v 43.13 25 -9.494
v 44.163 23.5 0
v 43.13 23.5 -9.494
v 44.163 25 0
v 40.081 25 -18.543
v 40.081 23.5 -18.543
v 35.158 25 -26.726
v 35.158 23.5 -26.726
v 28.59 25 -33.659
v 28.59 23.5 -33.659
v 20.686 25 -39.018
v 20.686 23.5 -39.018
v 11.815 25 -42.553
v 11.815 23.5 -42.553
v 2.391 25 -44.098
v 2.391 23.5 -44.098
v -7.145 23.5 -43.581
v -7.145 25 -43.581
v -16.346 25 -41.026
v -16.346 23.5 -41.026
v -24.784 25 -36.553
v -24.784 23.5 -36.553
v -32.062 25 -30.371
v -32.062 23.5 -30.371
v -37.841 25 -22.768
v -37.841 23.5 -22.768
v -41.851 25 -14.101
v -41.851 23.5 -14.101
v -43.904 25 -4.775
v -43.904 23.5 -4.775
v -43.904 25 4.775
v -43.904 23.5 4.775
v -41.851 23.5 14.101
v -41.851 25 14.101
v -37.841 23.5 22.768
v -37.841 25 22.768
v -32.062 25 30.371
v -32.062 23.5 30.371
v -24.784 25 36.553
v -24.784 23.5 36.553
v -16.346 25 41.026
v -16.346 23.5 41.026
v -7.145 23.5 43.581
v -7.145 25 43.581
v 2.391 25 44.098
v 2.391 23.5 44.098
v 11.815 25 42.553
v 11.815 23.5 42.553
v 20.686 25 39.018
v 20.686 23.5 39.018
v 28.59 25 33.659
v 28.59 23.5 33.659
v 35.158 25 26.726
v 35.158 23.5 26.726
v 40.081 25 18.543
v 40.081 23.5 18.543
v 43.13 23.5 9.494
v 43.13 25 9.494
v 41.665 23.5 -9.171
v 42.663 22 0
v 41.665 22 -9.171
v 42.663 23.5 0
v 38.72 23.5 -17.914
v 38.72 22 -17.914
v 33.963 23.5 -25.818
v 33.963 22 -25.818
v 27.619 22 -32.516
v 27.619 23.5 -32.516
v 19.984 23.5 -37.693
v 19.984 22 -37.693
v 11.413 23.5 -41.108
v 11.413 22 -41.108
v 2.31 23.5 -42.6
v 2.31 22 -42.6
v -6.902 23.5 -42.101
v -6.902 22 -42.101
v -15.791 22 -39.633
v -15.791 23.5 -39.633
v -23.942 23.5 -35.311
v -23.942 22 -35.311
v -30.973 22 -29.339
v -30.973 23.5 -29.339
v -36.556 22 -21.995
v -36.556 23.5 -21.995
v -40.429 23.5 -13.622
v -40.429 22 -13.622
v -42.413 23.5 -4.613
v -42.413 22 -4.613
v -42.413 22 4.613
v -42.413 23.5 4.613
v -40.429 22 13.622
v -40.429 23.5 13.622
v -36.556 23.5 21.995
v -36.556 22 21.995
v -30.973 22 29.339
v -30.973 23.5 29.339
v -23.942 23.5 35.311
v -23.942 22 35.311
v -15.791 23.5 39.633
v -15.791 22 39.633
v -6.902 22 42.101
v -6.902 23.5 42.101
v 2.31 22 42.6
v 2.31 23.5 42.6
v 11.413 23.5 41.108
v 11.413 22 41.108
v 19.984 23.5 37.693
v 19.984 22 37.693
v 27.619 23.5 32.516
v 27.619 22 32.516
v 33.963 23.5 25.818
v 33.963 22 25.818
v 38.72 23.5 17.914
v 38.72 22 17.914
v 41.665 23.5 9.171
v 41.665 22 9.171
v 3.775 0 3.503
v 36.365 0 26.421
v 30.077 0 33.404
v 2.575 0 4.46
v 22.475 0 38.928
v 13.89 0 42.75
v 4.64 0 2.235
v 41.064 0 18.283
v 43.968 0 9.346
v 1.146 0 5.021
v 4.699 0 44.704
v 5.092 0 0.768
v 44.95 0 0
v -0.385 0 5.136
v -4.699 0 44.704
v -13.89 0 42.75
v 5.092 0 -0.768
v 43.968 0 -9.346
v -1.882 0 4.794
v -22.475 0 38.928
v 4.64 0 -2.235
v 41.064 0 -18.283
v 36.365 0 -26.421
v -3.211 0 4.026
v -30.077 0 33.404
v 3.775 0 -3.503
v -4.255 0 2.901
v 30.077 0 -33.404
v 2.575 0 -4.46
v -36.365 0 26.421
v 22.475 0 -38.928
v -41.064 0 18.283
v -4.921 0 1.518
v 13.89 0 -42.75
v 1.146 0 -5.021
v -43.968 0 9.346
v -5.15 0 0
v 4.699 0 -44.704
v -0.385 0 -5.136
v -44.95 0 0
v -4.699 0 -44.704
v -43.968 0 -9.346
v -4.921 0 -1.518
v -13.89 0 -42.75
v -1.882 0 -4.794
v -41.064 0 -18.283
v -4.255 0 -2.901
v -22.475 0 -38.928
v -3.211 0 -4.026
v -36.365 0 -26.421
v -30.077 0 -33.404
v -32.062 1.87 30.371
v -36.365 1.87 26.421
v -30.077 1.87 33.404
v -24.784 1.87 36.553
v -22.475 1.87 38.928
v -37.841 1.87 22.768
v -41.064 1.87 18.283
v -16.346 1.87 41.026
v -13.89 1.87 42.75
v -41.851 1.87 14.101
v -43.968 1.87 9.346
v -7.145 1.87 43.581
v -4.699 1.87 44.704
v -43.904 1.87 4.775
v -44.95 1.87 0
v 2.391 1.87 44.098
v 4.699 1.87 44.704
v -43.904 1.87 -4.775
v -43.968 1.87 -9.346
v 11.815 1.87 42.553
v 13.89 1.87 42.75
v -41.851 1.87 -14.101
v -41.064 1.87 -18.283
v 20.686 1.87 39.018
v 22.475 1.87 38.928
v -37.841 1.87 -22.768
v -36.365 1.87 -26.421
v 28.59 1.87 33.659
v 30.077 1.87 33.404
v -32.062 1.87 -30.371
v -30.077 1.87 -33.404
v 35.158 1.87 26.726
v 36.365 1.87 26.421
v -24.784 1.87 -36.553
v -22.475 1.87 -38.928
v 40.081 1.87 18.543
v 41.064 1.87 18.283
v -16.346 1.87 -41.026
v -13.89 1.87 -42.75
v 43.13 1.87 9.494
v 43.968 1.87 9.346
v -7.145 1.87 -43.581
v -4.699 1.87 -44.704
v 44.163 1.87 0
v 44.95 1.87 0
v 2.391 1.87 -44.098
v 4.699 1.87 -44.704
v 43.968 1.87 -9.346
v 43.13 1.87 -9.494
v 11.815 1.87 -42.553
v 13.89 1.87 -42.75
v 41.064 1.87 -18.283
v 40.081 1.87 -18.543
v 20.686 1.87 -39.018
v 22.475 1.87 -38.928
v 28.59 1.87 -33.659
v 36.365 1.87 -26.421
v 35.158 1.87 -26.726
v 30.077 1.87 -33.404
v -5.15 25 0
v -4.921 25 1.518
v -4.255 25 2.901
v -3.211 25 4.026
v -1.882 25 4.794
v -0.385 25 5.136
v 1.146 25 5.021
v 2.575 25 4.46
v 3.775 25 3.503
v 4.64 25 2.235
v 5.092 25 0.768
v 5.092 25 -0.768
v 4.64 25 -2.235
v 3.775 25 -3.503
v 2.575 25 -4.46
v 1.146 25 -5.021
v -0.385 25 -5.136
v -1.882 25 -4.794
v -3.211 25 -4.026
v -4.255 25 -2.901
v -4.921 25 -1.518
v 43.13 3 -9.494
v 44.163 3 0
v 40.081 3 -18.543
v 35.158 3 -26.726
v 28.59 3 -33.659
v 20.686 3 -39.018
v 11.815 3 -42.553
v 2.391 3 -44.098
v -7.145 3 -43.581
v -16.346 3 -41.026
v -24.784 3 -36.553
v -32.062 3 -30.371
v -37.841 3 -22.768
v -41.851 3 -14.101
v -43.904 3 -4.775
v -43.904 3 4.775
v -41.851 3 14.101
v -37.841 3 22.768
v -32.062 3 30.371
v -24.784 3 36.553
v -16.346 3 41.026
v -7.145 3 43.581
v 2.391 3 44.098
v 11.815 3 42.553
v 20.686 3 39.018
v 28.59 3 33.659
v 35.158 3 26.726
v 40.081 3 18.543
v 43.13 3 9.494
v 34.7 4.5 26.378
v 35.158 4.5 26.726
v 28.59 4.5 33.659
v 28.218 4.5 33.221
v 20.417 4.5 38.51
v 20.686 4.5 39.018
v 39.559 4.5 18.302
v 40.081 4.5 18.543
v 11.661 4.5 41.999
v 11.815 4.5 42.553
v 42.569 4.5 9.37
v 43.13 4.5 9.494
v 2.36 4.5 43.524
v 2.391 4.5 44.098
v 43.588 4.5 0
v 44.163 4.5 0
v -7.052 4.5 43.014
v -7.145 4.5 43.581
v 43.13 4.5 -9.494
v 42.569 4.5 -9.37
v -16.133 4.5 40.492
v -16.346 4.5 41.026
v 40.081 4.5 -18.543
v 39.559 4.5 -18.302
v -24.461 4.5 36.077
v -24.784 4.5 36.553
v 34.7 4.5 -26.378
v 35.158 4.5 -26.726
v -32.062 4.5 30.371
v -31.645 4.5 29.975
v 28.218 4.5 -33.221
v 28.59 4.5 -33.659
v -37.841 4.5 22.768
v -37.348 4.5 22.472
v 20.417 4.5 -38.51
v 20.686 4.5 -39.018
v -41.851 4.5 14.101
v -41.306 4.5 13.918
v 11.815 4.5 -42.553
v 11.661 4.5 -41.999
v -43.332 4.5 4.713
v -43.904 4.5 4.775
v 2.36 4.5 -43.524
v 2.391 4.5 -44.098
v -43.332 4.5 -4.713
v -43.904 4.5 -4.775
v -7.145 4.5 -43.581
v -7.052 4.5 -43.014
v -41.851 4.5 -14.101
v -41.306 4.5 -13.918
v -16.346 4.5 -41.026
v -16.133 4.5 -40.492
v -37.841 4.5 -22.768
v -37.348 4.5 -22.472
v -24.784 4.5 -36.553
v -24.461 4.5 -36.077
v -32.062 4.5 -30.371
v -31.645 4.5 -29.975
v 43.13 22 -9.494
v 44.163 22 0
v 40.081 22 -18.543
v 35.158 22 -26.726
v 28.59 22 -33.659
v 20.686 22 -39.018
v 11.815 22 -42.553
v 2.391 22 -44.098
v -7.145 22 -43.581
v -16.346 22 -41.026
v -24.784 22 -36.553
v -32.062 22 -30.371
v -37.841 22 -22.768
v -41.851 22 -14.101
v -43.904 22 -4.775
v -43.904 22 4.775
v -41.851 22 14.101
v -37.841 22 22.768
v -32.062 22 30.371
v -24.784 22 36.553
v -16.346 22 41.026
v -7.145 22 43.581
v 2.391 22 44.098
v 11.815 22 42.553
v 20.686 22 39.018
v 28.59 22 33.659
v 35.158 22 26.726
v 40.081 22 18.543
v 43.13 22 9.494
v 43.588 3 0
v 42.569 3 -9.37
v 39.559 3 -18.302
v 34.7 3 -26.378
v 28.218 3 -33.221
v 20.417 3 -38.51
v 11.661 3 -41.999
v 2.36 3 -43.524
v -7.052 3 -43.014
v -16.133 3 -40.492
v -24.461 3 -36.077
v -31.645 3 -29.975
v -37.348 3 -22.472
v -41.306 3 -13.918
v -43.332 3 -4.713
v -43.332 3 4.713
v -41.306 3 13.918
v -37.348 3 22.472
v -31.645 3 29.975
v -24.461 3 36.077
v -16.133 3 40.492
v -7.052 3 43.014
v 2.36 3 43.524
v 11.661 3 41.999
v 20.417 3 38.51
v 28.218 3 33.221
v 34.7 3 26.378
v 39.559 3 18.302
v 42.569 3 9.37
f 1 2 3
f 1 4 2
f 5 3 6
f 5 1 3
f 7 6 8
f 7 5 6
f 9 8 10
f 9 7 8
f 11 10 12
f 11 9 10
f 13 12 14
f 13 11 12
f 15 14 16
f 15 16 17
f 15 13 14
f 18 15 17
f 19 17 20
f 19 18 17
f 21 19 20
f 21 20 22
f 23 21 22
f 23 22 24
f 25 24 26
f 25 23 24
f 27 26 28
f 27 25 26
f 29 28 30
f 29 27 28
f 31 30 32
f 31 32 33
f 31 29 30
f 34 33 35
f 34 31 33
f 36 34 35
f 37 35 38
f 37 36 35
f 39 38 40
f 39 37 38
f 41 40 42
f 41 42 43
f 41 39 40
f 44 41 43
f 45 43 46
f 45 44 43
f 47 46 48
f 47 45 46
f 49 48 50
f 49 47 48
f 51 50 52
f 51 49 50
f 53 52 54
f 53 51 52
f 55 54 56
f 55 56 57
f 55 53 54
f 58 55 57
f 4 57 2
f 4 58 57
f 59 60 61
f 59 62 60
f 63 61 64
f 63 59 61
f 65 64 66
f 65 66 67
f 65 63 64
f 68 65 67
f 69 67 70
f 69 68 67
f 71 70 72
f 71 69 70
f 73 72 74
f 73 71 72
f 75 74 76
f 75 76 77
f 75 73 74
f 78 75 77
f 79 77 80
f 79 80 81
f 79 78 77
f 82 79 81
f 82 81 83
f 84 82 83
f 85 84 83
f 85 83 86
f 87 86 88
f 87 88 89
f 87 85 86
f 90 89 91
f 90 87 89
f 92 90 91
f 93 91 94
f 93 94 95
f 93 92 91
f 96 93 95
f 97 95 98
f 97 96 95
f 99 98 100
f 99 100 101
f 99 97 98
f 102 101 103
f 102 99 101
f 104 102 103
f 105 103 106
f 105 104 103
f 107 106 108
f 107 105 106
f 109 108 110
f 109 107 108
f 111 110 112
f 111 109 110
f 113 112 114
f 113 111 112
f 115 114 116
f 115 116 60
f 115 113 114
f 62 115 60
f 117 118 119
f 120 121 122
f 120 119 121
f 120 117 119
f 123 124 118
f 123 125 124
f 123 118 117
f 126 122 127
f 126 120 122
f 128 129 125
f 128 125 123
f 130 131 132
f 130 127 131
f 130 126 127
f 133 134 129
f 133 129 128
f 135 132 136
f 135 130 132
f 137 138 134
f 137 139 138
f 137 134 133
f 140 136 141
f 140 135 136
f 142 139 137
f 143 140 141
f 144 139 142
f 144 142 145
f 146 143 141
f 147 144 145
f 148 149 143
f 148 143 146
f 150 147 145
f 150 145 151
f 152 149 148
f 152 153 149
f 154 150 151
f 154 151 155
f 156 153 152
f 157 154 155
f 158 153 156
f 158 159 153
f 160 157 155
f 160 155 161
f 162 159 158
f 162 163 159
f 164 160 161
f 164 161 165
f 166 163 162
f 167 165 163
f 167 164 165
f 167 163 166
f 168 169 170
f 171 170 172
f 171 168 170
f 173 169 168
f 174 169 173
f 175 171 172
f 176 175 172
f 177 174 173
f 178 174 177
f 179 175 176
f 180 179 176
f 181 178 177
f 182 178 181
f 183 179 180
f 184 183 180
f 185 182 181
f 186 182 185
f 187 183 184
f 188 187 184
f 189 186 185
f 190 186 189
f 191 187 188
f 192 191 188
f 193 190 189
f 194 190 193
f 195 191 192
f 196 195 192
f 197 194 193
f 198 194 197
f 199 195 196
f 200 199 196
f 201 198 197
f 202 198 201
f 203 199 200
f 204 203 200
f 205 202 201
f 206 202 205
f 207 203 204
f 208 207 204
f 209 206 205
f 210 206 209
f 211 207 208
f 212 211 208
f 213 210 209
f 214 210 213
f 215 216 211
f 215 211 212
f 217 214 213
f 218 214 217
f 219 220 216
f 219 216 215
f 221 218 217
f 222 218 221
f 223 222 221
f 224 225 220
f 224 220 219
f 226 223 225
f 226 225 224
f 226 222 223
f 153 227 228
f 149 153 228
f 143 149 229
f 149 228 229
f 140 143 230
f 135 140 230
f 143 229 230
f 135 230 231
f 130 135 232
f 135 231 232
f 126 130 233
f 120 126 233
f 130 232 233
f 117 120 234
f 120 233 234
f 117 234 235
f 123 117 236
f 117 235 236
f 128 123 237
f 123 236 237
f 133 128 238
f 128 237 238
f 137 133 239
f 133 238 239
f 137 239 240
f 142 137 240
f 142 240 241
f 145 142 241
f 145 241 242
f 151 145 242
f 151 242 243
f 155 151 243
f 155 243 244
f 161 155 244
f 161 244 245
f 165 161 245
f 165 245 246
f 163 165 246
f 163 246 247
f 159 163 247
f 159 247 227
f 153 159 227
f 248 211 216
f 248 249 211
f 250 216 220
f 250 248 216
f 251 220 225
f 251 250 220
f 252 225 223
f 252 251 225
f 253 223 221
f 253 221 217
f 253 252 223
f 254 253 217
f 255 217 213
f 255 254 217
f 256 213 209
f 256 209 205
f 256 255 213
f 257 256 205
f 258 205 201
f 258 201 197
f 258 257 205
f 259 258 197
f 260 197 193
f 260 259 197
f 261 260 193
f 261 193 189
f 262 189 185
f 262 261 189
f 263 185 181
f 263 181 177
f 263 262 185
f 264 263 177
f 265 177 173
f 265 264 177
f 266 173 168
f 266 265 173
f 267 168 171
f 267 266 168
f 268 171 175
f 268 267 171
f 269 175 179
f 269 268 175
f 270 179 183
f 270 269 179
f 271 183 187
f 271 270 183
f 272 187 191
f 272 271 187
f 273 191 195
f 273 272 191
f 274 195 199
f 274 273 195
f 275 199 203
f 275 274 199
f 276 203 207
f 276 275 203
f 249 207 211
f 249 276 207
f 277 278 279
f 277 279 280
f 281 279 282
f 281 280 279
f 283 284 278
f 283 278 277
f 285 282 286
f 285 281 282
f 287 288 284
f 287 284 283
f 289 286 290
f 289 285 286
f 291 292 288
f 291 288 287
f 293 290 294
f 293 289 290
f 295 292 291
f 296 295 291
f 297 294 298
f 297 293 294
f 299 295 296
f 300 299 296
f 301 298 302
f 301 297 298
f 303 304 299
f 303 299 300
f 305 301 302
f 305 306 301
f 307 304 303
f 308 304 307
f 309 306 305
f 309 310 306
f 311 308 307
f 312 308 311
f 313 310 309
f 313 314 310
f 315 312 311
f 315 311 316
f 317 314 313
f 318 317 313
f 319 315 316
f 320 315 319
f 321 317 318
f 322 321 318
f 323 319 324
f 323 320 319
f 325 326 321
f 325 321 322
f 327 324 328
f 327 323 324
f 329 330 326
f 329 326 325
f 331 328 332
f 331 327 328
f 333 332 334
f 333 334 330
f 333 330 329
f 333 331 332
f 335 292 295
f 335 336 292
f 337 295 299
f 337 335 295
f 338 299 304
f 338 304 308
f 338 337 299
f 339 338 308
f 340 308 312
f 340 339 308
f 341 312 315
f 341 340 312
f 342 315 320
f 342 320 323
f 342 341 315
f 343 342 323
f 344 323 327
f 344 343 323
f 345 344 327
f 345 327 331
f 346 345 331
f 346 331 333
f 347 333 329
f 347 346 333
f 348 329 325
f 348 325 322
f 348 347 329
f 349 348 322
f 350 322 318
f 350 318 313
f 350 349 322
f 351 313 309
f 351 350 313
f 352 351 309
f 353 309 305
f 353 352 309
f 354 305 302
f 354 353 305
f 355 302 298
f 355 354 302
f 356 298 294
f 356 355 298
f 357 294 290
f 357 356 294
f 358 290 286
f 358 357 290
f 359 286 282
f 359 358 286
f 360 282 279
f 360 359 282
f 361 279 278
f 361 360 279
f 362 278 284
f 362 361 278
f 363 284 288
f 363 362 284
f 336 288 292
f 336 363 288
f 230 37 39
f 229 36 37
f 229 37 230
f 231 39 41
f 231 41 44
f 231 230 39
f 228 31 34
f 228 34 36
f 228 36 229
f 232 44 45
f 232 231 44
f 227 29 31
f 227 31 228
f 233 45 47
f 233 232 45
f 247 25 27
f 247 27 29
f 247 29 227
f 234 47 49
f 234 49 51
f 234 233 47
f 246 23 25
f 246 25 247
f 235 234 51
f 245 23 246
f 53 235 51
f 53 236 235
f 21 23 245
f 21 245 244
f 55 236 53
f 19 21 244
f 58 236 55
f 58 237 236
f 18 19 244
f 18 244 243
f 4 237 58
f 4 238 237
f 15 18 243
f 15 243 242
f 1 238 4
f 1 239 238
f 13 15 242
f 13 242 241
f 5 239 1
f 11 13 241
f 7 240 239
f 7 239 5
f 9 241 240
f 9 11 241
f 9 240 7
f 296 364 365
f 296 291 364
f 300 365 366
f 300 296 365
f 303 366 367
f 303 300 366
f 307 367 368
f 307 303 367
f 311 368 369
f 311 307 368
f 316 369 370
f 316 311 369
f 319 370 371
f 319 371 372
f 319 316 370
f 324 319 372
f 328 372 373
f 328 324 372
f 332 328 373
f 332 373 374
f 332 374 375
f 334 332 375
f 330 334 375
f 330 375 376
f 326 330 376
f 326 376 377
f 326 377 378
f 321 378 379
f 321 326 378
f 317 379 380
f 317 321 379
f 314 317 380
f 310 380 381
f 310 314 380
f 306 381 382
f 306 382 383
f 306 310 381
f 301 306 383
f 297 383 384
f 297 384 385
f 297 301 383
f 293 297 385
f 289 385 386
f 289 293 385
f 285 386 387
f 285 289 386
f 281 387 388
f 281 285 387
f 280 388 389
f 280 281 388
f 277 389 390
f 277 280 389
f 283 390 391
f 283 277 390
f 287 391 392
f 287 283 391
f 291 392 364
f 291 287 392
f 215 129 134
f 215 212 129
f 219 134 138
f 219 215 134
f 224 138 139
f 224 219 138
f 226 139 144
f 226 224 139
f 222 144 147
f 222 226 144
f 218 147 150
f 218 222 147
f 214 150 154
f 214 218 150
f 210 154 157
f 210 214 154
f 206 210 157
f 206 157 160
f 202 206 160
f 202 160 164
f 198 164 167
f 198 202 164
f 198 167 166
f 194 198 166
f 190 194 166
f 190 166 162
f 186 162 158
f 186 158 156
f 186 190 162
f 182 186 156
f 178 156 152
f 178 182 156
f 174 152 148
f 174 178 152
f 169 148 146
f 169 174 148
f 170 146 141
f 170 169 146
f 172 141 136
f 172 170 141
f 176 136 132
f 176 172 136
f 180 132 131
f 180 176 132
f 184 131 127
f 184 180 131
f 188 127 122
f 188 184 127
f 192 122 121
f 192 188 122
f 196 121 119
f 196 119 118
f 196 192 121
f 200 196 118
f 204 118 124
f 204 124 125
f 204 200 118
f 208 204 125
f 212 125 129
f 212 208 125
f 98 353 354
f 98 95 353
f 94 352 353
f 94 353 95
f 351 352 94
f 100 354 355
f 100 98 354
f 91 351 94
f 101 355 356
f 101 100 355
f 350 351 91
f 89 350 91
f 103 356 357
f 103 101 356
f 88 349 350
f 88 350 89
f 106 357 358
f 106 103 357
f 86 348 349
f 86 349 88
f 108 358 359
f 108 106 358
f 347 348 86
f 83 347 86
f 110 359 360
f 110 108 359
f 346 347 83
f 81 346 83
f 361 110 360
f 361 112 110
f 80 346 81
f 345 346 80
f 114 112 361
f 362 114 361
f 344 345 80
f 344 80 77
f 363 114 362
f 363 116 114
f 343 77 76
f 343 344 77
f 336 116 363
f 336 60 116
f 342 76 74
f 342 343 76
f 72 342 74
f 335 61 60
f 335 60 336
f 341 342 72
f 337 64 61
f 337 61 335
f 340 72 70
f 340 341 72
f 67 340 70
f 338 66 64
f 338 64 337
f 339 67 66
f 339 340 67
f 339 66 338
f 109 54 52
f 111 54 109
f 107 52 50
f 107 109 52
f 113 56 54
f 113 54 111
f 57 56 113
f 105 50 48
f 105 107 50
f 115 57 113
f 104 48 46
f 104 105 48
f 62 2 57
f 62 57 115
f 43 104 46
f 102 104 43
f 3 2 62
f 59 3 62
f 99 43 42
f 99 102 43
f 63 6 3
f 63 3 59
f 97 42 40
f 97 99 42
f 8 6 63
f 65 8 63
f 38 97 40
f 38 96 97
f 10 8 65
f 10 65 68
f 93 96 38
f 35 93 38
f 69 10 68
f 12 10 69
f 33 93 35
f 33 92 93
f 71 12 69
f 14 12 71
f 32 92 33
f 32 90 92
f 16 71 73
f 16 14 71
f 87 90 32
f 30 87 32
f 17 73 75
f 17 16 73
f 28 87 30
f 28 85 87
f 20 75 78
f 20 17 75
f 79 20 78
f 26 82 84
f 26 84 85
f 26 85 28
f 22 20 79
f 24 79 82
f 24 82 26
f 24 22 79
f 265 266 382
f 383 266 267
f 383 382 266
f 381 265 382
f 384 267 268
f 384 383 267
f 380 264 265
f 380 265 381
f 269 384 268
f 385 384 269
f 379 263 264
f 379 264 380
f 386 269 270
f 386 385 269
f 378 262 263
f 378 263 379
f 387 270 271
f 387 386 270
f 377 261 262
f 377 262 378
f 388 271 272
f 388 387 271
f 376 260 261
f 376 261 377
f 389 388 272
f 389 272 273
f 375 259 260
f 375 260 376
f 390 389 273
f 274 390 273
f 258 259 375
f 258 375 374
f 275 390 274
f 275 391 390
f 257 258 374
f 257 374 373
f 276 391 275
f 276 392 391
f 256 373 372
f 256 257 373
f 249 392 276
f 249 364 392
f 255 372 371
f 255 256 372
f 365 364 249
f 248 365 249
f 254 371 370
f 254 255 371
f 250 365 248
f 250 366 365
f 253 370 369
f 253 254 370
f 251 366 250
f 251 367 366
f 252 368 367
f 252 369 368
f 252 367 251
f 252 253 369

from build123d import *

# Parameters (mm, degrees)
F3_D = 10.3


with BuildPart() as f1:
    # F0 (on Top) → F1 (revolve)
    with BuildSketch(Plane.XY):
        Polygon((0, 25), (0, 0), (44.95, 0), (44.95, 1.8701055199), (44.1626615226, 1.8701055199), (44.1626615226, 3), (43.5877479613, 3), (43.5877479613, 4.5), (44.1626615226, 4.5), (44.1626615226, 22), (42.6626615226, 22), (42.6626615226, 23.5), (44.1626615226, 23.5), (44.1626615226, 25), align=None)
    revolve(axis=Axis((0, 12.5, 0), (0, 1, 0)))

    # F3 (through all)
    with Locations(Plane.XZ):
        with Locations((0, 0)):
            Hole(F3_D / 2)


solid = f1.part
